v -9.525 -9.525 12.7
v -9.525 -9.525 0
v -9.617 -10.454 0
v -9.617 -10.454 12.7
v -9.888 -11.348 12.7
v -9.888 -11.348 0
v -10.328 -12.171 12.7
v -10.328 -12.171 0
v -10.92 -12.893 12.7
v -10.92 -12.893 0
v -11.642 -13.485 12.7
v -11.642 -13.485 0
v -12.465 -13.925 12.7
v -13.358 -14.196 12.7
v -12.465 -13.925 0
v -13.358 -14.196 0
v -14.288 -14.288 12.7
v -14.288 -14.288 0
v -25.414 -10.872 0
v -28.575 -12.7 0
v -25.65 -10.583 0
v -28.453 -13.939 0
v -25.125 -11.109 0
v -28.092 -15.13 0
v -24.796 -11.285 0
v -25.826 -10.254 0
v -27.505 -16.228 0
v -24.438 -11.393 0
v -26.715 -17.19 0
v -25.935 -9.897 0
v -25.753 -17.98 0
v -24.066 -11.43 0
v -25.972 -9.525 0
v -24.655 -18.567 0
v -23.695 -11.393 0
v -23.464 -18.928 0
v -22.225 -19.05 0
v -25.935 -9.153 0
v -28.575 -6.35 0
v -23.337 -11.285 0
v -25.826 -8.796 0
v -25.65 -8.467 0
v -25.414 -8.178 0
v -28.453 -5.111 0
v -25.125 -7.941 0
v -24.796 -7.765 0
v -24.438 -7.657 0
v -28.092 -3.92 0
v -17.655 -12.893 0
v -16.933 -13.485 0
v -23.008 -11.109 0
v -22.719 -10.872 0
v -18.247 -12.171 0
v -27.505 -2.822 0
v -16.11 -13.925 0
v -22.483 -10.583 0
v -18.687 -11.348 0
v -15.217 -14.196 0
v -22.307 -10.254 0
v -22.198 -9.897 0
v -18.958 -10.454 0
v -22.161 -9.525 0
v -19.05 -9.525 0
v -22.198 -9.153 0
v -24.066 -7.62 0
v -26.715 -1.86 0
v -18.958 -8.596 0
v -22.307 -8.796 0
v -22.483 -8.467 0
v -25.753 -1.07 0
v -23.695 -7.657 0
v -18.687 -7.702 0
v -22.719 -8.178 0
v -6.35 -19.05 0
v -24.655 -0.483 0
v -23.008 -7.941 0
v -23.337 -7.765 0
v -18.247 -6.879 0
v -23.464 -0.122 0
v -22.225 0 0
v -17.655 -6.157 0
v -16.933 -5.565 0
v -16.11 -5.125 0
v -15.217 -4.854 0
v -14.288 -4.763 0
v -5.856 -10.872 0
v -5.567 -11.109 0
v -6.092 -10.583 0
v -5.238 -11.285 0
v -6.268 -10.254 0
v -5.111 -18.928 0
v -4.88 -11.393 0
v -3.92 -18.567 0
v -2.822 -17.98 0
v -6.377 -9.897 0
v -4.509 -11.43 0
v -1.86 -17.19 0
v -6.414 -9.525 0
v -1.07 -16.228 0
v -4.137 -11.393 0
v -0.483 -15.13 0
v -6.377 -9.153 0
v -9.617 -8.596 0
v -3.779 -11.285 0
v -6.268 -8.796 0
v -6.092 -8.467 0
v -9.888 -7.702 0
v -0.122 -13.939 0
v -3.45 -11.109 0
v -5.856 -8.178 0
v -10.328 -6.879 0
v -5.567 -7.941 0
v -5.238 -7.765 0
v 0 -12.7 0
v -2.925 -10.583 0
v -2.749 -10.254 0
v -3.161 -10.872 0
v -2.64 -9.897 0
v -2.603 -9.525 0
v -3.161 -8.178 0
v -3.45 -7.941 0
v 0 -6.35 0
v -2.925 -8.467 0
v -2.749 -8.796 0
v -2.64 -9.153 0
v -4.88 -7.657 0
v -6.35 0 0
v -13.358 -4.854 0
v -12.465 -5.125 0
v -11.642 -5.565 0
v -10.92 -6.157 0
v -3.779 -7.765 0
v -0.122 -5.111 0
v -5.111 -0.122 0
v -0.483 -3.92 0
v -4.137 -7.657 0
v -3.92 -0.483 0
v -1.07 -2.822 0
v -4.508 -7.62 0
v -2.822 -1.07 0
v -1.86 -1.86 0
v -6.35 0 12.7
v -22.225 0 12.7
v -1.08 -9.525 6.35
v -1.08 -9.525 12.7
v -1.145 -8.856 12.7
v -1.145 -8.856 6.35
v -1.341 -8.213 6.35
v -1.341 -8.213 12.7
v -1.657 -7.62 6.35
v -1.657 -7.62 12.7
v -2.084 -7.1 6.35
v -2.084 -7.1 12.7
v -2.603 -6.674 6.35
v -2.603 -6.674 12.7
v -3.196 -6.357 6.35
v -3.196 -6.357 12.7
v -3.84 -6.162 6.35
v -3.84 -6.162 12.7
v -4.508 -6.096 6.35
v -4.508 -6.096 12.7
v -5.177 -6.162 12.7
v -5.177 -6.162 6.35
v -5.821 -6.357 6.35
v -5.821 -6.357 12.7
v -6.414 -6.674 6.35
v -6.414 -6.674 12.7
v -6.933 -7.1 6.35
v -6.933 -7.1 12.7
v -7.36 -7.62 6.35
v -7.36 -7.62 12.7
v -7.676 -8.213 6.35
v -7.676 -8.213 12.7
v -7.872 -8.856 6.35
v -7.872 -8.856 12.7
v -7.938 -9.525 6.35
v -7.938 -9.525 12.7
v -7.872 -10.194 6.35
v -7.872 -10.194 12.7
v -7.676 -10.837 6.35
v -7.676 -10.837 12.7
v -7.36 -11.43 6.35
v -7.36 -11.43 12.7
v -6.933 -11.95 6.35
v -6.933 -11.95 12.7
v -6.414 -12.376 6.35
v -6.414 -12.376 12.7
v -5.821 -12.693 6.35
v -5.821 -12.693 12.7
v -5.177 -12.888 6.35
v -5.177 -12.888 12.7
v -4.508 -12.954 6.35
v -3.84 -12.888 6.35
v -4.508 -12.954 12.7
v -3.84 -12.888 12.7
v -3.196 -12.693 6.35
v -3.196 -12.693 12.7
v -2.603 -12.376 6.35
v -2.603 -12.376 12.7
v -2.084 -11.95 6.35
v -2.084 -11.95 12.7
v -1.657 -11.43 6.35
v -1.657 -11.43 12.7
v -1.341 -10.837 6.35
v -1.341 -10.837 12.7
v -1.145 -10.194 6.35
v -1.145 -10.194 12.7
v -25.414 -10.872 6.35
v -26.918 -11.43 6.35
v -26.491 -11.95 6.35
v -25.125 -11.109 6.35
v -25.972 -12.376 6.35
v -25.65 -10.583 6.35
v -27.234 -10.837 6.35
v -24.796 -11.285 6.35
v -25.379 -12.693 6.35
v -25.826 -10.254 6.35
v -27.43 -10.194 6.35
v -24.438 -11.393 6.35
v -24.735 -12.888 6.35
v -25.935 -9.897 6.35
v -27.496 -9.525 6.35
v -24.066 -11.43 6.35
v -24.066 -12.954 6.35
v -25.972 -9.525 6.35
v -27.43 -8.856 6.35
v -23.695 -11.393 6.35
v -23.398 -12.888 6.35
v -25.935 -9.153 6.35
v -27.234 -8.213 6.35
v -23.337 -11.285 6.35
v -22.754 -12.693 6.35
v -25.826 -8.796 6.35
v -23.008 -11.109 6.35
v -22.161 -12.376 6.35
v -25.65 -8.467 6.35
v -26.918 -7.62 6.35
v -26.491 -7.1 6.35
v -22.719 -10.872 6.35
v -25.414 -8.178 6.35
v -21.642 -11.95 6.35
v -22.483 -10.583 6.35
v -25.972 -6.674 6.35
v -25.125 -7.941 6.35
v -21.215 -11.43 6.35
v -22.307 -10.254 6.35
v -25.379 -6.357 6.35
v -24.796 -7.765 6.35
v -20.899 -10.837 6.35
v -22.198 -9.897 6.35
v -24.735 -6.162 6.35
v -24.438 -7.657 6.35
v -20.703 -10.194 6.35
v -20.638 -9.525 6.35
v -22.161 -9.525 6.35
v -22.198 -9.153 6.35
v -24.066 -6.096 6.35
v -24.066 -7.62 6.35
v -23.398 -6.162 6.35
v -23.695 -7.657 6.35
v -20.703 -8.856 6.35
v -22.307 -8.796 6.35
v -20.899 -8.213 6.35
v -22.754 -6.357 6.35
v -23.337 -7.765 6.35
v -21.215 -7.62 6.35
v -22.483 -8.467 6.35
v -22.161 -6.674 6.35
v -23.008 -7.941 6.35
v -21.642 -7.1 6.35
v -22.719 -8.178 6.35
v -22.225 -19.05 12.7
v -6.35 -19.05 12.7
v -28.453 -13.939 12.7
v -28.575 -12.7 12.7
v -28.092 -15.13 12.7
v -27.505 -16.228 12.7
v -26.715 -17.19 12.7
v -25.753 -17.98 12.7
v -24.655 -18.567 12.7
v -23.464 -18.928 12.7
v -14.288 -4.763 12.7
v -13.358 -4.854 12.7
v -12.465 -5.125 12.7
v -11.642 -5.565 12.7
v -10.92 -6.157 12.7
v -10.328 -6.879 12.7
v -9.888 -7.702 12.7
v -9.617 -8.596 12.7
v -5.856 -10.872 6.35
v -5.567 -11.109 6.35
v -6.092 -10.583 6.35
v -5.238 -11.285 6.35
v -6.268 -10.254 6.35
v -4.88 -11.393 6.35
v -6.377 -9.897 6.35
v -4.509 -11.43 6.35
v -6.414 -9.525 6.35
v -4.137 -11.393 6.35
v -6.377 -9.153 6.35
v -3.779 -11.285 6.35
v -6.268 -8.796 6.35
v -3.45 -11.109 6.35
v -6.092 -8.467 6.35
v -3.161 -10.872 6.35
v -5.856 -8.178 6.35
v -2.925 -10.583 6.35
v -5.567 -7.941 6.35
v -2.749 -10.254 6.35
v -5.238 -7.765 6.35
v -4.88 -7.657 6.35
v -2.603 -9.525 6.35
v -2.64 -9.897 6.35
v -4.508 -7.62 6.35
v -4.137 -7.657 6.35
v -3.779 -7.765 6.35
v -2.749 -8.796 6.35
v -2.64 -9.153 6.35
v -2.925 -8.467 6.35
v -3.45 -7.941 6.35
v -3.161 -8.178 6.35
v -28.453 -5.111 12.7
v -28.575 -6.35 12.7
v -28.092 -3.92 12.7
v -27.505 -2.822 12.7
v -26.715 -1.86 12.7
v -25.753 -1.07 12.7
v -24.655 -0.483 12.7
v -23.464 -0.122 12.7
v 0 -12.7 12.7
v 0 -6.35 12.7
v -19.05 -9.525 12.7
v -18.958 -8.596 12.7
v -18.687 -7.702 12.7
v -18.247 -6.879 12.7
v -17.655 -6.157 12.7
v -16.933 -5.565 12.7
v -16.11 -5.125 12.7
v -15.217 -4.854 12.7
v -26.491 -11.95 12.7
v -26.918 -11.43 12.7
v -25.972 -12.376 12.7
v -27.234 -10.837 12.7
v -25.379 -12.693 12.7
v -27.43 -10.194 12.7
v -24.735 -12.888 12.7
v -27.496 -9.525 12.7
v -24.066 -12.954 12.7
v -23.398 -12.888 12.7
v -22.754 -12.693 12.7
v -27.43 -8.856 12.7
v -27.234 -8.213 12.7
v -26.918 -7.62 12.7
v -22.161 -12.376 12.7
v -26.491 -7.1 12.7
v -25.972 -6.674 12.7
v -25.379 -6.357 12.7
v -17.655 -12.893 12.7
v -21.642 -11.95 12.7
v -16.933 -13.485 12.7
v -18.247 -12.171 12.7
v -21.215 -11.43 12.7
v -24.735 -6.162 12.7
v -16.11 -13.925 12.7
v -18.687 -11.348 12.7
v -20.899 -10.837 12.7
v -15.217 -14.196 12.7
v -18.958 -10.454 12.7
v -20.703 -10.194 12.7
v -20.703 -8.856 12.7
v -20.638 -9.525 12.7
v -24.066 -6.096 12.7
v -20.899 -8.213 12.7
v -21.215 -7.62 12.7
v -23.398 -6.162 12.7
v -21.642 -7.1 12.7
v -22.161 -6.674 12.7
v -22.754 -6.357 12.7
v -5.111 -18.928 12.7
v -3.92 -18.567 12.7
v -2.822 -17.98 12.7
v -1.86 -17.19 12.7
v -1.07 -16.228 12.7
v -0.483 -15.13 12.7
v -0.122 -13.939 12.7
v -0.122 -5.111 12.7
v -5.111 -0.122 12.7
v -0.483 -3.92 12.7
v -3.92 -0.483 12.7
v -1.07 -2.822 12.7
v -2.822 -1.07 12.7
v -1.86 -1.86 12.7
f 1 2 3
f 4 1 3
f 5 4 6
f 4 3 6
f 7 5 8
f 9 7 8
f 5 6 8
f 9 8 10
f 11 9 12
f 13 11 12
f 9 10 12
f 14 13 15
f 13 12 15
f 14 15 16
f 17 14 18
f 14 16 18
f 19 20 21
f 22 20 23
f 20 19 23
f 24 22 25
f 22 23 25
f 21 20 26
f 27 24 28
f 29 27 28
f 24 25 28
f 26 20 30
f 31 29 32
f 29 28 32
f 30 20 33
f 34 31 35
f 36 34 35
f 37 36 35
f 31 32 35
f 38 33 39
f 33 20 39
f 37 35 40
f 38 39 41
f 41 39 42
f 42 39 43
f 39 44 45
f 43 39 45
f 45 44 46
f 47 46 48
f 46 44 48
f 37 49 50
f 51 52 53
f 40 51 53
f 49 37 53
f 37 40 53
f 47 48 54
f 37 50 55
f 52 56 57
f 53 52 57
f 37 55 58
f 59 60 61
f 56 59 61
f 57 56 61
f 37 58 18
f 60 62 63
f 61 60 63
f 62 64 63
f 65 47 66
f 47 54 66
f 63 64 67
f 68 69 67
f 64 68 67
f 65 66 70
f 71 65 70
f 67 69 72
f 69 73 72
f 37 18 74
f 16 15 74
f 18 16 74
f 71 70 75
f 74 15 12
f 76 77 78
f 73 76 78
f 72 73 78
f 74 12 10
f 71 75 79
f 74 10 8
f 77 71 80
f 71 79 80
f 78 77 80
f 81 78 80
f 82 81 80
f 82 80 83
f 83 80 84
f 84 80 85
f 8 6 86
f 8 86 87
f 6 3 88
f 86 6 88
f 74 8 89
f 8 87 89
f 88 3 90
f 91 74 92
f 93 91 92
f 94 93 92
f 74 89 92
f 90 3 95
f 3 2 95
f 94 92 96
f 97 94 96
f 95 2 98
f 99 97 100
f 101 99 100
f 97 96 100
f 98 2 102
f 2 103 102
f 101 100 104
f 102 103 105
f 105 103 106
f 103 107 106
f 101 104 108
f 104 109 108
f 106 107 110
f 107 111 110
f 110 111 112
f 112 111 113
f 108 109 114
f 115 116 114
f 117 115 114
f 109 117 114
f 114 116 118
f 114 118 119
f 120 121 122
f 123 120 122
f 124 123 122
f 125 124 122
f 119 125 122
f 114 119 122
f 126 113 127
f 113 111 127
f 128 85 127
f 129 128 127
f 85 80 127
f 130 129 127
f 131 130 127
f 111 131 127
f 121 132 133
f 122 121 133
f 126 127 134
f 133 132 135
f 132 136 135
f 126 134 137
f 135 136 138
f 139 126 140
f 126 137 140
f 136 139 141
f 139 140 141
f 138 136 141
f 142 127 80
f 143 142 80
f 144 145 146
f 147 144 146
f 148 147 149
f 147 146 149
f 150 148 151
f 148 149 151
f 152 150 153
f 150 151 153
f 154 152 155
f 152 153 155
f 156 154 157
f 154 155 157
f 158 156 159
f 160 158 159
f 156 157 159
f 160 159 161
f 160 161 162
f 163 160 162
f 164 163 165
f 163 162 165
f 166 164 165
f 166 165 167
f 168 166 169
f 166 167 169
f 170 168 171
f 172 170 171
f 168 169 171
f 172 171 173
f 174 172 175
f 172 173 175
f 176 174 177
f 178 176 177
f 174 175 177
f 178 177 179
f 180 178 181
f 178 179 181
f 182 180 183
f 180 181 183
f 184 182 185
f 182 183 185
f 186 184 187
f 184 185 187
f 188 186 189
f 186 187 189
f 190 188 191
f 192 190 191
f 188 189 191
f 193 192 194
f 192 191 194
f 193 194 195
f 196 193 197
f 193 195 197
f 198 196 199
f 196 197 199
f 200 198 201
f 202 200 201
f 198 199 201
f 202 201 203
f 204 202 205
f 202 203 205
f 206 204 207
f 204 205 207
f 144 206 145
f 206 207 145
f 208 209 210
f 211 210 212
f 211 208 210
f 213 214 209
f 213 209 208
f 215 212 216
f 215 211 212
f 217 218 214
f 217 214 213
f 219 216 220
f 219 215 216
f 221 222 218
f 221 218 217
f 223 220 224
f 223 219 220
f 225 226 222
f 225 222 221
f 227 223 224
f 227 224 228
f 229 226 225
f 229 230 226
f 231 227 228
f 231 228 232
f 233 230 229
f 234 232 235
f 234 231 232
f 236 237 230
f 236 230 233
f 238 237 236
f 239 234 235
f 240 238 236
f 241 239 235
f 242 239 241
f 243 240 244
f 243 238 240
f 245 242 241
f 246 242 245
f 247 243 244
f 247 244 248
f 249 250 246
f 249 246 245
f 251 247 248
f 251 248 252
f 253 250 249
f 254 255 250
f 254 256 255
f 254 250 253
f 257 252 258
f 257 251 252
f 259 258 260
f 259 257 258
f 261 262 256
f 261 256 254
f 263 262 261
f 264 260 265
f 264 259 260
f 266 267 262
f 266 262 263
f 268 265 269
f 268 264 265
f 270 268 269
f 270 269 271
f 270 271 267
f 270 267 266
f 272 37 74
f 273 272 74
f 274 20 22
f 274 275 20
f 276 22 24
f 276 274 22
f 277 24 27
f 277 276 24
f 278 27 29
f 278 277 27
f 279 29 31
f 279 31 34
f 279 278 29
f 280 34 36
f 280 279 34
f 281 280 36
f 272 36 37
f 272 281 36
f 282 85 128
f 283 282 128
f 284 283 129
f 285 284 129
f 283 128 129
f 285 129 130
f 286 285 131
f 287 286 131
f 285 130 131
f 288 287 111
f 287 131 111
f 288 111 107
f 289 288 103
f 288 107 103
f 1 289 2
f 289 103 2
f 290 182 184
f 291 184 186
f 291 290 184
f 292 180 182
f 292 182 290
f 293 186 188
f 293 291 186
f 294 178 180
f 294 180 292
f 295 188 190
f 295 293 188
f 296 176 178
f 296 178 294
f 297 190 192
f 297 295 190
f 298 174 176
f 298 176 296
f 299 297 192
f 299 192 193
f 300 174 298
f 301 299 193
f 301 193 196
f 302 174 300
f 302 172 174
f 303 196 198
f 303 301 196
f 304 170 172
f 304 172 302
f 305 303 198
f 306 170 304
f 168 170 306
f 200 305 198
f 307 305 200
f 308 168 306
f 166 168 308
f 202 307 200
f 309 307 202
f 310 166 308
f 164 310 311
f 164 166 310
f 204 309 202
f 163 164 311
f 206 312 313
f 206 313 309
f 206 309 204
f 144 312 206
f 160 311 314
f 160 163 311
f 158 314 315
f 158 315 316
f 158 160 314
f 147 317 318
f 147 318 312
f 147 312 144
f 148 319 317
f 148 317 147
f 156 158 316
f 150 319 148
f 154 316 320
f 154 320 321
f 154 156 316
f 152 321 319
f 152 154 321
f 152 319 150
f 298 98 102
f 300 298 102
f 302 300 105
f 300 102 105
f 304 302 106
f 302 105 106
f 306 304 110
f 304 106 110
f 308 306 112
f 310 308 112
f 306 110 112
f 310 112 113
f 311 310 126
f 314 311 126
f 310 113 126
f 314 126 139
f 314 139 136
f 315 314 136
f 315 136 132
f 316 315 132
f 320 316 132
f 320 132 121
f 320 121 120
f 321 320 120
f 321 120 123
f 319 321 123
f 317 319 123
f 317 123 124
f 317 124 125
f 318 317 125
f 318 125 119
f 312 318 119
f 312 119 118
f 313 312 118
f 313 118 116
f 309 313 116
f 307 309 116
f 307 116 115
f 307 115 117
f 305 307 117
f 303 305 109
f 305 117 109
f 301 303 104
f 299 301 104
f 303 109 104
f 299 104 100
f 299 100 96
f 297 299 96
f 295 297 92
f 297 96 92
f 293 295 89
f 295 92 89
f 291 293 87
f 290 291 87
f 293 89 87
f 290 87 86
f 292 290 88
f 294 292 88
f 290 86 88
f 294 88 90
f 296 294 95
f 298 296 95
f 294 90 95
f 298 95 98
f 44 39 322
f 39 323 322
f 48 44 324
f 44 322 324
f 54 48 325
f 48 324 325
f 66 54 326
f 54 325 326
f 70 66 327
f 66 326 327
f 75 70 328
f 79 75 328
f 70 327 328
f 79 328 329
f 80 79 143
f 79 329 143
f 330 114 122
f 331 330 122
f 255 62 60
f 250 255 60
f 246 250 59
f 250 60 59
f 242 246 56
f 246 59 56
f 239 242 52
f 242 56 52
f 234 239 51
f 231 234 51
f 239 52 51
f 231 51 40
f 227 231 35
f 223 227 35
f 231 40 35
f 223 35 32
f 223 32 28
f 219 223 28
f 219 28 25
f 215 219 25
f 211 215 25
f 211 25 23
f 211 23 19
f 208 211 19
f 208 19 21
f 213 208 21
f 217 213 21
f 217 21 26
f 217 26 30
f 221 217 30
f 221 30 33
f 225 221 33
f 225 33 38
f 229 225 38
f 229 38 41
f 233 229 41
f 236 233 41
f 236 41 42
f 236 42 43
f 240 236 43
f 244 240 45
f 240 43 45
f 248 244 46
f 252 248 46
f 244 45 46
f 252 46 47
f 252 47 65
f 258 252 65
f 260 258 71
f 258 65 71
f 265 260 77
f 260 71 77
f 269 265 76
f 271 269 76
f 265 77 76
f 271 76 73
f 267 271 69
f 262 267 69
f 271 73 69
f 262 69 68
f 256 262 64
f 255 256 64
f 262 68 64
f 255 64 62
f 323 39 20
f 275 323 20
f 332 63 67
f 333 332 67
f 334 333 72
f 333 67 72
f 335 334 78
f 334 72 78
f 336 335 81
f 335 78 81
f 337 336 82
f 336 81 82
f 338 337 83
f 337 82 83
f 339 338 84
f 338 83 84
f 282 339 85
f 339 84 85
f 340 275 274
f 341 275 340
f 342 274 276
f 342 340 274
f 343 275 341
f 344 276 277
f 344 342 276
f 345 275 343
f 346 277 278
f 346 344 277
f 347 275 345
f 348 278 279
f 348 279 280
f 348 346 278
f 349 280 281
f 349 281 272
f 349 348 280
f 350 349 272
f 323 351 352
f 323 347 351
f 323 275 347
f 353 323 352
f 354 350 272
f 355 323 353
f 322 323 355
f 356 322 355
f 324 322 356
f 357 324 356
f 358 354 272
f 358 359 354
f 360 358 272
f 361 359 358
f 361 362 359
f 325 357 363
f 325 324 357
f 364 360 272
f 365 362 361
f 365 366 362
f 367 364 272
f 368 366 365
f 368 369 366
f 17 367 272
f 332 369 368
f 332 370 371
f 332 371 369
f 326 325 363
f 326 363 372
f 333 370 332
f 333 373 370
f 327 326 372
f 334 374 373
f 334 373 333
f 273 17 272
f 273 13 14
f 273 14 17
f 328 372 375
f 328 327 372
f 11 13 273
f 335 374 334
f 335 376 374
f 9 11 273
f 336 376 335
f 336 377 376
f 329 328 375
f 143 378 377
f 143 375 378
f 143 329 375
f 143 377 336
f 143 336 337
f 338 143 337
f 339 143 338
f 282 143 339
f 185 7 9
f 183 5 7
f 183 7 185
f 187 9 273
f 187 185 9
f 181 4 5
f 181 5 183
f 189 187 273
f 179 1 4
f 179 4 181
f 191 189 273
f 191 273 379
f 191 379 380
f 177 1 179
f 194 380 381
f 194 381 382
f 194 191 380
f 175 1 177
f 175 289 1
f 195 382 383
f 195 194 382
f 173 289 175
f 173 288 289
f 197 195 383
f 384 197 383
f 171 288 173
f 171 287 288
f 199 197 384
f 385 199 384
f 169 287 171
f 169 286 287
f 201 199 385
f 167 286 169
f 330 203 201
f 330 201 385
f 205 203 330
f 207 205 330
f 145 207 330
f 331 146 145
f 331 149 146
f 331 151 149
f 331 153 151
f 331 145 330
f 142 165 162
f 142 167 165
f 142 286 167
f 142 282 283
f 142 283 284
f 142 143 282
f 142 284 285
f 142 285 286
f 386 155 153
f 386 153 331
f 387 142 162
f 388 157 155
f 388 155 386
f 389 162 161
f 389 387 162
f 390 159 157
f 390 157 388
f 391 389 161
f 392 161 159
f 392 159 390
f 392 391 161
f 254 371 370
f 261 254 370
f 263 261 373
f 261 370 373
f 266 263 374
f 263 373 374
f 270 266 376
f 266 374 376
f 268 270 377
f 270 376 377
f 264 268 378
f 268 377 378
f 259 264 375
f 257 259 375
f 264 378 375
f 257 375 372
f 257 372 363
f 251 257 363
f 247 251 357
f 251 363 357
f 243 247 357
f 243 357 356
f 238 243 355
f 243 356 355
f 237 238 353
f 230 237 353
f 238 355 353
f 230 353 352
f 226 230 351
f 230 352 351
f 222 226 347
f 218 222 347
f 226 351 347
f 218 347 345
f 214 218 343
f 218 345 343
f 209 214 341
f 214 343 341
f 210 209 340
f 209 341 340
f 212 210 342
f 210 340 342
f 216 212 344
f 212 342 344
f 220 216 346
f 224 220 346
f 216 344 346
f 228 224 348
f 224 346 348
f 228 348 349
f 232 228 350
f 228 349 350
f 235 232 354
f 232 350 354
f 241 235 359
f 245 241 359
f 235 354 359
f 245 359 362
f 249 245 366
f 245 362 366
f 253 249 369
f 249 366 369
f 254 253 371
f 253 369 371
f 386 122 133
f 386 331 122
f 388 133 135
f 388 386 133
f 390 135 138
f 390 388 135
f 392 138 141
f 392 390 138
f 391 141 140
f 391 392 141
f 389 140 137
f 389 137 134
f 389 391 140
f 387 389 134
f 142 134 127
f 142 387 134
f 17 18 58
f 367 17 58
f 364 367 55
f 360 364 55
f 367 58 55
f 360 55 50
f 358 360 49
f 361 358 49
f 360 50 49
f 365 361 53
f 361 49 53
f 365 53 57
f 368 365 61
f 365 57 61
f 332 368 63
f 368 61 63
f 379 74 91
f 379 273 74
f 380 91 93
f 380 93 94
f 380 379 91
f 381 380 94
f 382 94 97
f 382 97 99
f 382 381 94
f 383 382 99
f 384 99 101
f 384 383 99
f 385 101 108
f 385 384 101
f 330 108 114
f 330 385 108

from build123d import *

# Parameters (mm, degrees)
BOSS_EXTRUDE1_DEPTH = 12.7
FILLET1_R           = 6.35
SKETCH2_R           = 3.429
CUT_EXTRUDE1_DEPTH  = 6.35


with BuildPart() as part:
    # Sketch1 → Boss-Extrude1 (new body)
    with BuildSketch(Plane.XY):
        with BuildLine():
            Line((-14.2875, -4.7625), (-14.2875, 0))
            Line((-14.2875, 0), (-28.575, 0))
            Line((-28.575, 0), (-28.575, -9.525))
            Line((-28.575, -9.525), (-25.9715, -9.525))
            ThreePointArc((-25.9715, -9.525), (-24.0665, -7.62), (-22.1615, -9.525))
            Line((-22.1615, -9.525), (-19.05, -9.525))
            ThreePointArc((-19.05, -9.525), (-17.655096045, -6.157403955), (-14.2875, -4.7625))
        make_face()
        with BuildLine():
            ThreePointArc((-14.2875, -14.2875), (-17.655096045, -12.892596045), (-19.05, -9.525))
            Line((-19.05, -9.525), (-22.1615, -9.525))
            ThreePointArc((-22.1615, -9.525), (-24.0665, -11.43), (-25.9715, -9.525))
            Line((-25.9715, -9.525), (-28.575, -9.525))
            Line((-28.575, -9.525), (-28.575, -19.05))
            Line((-28.575, -19.05), (-14.2875, -19.05))
            Line((-14.2875, -19.05), (-14.2875, -14.2875))
        make_face()
        with BuildLine():
            Line((-6.4135, -9.525), (-9.525, -9.525))
            ThreePointArc((-9.525, -9.525), (-10.919903955, -12.892596045), (-14.2875, -14.2875))
            Line((-14.2875, -14.2875), (-14.2875, -19.05))
            Line((-14.2875, -19.05), (0, -19.05))
            Line((0, -19.05), (0, -9.525))
            Line((0, -9.525), (-2.6035, -9.525))
            ThreePointArc((-2.6035, -9.525), (-4.5085, -11.43), (-6.4135, -9.525))
        make_face()
        with BuildLine():
            Line((0, 0), (-14.2875, 0))
            Line((-14.2875, 0), (-14.2875, -4.7625))
            ThreePointArc((-14.2875, -4.7625), (-10.919903955, -6.157403955), (-9.525, -9.525))
            Line((-9.525, -9.525), (-6.4135, -9.525))
            ThreePointArc((-6.4135, -9.525), (-4.5085, -7.62), (-2.6035, -9.525))
            Line((-2.6035, -9.525), (0, -9.525))
            Line((0, -9.525), (0, 0))
        make_face()
    extrude(amount=BOSS_EXTRUDE1_DEPTH)

    # Fillet1
    fillet1_edges = [part.edges().sort_by_distance(p)[0] for p in [
        (-28.575, -19.05, 6.35),
        (-28.575, 0, 6.35),
        (0, 0, 6.35),
        (0, -19.05, 6.35),
    ]]
    fillet(fillet1_edges, radius=FILLET1_R)

    # Sketch2 → Cut-Extrude1 (cut)
    with BuildSketch(Plane.XY.offset(12.7)):
        with Locations((-24.0665, -9.525)):
            Circle(SKETCH2_R)
        with Locations((-4.5085, -9.525)):
            Circle(SKETCH2_R)
    extrude(amount=-CUT_EXTRUDE1_DEPTH, mode=Mode.SUBTRACT)


solid = part.part
